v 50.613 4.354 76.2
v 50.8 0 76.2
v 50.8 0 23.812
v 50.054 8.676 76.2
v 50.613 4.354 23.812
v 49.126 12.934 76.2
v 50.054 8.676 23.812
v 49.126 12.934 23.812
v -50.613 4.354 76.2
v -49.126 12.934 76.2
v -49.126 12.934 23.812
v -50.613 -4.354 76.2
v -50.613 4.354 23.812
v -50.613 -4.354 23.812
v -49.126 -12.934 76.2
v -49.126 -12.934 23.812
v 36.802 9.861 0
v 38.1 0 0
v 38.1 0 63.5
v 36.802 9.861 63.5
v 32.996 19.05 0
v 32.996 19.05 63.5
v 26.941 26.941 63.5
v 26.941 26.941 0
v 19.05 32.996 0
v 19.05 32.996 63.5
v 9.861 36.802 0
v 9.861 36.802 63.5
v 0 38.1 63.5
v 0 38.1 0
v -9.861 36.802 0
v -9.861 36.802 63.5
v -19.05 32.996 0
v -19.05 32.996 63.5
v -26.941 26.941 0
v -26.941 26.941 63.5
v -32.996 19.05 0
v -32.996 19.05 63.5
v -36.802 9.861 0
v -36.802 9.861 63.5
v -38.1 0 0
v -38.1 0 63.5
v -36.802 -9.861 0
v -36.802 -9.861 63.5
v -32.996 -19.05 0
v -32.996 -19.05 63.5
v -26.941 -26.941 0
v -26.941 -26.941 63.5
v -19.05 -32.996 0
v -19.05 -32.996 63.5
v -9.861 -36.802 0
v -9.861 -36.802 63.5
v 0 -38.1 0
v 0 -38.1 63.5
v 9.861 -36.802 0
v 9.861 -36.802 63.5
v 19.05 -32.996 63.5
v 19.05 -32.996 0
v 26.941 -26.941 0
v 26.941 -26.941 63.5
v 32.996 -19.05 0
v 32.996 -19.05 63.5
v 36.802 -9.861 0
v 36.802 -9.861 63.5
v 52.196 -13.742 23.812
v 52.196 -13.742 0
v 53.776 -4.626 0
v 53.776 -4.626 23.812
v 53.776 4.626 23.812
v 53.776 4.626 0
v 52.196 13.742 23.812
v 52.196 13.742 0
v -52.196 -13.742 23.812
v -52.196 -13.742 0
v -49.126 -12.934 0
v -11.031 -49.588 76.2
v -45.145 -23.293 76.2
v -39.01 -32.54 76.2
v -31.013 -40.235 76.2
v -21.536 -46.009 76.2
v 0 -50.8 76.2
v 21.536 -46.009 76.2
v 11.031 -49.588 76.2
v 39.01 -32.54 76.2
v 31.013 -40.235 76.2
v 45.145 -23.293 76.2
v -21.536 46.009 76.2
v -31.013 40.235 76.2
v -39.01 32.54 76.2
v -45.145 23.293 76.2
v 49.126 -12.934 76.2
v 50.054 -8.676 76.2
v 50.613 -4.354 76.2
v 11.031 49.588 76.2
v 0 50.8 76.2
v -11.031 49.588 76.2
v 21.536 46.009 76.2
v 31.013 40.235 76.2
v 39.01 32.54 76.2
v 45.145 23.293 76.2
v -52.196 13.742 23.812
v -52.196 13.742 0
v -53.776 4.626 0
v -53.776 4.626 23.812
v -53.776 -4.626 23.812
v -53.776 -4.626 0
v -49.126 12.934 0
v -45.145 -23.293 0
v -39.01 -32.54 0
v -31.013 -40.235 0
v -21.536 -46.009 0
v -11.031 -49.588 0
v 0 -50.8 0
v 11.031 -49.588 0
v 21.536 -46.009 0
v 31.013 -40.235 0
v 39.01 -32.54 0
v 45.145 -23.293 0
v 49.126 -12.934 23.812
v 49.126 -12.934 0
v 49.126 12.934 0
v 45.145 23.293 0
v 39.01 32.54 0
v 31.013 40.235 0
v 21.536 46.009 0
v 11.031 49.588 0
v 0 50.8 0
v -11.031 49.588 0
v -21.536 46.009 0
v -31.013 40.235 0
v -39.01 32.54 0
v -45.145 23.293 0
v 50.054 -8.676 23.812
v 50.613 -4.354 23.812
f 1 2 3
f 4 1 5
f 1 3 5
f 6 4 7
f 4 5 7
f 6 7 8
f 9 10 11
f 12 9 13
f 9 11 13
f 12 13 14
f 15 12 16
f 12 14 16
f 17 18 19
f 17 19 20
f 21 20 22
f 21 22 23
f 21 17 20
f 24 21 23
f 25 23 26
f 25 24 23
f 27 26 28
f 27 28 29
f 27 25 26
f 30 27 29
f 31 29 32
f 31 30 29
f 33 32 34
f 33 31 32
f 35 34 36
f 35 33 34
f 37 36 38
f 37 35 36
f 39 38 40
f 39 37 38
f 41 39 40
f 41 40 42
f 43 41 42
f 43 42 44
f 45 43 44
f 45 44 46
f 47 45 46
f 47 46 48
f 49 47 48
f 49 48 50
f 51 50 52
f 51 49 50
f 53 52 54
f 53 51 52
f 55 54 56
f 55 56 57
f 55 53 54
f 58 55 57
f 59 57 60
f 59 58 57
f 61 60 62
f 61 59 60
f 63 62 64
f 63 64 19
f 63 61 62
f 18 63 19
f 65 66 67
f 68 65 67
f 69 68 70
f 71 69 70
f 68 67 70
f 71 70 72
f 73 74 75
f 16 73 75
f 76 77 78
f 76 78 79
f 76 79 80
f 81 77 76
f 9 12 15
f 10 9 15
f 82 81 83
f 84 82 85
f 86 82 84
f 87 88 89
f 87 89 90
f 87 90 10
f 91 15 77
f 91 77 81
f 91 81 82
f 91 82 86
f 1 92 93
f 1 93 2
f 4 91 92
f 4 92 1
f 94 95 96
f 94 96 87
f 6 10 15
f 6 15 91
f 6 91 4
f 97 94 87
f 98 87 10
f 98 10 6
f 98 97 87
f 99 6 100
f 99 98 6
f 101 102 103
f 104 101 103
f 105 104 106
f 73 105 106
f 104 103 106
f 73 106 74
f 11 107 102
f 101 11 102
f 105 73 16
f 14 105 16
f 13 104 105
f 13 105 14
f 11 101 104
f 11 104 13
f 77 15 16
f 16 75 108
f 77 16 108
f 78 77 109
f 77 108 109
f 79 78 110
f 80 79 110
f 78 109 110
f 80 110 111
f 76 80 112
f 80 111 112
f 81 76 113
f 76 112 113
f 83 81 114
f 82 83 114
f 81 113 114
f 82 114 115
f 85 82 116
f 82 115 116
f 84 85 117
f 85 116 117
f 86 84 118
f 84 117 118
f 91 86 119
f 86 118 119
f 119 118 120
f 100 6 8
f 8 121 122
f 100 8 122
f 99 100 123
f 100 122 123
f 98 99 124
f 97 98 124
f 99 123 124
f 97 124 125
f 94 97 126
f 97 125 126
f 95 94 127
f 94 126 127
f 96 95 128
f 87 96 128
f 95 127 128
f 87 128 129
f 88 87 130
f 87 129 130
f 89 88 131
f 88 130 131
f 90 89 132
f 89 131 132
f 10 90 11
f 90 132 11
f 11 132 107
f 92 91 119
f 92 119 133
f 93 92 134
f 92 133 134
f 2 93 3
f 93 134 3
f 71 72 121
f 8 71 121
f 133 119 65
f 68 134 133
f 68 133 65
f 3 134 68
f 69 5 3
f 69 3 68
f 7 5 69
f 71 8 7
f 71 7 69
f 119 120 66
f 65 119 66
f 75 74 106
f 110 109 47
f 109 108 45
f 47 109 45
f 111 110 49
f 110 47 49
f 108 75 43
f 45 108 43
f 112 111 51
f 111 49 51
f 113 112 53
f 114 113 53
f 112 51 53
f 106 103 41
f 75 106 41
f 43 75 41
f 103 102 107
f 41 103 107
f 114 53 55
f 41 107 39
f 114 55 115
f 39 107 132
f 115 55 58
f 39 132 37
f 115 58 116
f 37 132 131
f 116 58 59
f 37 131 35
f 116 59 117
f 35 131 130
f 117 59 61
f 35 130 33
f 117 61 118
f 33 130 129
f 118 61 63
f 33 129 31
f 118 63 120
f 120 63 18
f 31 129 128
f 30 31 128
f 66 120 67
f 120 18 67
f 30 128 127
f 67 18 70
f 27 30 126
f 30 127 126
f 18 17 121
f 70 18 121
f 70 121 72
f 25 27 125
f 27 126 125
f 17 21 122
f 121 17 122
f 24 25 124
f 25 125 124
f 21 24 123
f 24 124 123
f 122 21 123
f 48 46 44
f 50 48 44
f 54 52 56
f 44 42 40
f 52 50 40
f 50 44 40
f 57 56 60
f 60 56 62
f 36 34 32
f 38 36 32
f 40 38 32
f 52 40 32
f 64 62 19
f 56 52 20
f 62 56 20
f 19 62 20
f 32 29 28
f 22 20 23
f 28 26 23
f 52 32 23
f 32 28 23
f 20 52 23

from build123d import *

# Parameters (mm, degrees)
F0_R     = 38.1
F1_DEPTH = 76.2
F2_DEPTH = 23.8125
F3_DEPTH = 63.5


with BuildPart() as f1:
    # F0 (on Top) → F1 (new body)
    with BuildSketch(Plane.XY):
        with BuildLine():
            ThreePointArc((49.1259336968, -12.9337789688), (50.3797450956, -6.5208346169), (50.8, 0))
            ThreePointArc((50.8, 0), (50.3797450956, 6.5208346169), (49.1259336968, 12.9337789688))
            ThreePointArc((49.1259336968, 12.9337789688), (0, 50.8), (-49.1259336968, 12.9337789688))
            ThreePointArc((-49.1259336968, 12.9337789688), (-50.8, 0), (-49.1259336968, -12.9337789688))
            ThreePointArc((-49.1259336968, -12.9337789688), (0, -50.8), (49.1259336968, -12.9337789688))
        make_face()
        Circle(F0_R, mode=Mode.SUBTRACT)
        Circle(F0_R)
    extrude(amount=F1_DEPTH)

    # F0 (on Top) → F2 (join)
    with BuildSketch(Plane.XY):
        with BuildLine():
            ThreePointArc((-49.1259336968, -12.9337789688), (-50.8, 0), (-49.1259336968, 12.9337789688))
            Line((-49.1259336968, 12.9337789688), (-52.1963045529, 13.7421401544))
            ThreePointArc((-52.1963045529, 13.7421401544), (-53.975, 0), (-52.1963045529, -13.7421401544))
            Line((-52.1963045529, -13.7421401544), (-49.1259336968, -12.9337789688))
        make_face()
        with BuildLine():
            ThreePointArc((49.1259336968, 12.9337789688), (50.3797450956, 6.5208346169), (50.8, 0))
            ThreePointArc((50.8, 0), (50.3797450956, -6.5208346169), (49.1259336968, -12.9337789688))
            Line((49.1259336968, -12.9337789688), (52.1963045529, -13.7421401544))
            ThreePointArc((52.1963045529, -13.7421401544), (53.975, 0), (52.1963045529, 13.7421401544))
            Line((52.1963045529, 13.7421401544), (49.1259336968, 12.9337789688))
        make_face()
    extrude(amount=F2_DEPTH)

    # F0 (on Top) → F3 (cut)
    with BuildSketch(Plane.XY):
        Circle(F0_R)
    extrude(amount=F3_DEPTH, mode=Mode.SUBTRACT)


solid = f1.part
